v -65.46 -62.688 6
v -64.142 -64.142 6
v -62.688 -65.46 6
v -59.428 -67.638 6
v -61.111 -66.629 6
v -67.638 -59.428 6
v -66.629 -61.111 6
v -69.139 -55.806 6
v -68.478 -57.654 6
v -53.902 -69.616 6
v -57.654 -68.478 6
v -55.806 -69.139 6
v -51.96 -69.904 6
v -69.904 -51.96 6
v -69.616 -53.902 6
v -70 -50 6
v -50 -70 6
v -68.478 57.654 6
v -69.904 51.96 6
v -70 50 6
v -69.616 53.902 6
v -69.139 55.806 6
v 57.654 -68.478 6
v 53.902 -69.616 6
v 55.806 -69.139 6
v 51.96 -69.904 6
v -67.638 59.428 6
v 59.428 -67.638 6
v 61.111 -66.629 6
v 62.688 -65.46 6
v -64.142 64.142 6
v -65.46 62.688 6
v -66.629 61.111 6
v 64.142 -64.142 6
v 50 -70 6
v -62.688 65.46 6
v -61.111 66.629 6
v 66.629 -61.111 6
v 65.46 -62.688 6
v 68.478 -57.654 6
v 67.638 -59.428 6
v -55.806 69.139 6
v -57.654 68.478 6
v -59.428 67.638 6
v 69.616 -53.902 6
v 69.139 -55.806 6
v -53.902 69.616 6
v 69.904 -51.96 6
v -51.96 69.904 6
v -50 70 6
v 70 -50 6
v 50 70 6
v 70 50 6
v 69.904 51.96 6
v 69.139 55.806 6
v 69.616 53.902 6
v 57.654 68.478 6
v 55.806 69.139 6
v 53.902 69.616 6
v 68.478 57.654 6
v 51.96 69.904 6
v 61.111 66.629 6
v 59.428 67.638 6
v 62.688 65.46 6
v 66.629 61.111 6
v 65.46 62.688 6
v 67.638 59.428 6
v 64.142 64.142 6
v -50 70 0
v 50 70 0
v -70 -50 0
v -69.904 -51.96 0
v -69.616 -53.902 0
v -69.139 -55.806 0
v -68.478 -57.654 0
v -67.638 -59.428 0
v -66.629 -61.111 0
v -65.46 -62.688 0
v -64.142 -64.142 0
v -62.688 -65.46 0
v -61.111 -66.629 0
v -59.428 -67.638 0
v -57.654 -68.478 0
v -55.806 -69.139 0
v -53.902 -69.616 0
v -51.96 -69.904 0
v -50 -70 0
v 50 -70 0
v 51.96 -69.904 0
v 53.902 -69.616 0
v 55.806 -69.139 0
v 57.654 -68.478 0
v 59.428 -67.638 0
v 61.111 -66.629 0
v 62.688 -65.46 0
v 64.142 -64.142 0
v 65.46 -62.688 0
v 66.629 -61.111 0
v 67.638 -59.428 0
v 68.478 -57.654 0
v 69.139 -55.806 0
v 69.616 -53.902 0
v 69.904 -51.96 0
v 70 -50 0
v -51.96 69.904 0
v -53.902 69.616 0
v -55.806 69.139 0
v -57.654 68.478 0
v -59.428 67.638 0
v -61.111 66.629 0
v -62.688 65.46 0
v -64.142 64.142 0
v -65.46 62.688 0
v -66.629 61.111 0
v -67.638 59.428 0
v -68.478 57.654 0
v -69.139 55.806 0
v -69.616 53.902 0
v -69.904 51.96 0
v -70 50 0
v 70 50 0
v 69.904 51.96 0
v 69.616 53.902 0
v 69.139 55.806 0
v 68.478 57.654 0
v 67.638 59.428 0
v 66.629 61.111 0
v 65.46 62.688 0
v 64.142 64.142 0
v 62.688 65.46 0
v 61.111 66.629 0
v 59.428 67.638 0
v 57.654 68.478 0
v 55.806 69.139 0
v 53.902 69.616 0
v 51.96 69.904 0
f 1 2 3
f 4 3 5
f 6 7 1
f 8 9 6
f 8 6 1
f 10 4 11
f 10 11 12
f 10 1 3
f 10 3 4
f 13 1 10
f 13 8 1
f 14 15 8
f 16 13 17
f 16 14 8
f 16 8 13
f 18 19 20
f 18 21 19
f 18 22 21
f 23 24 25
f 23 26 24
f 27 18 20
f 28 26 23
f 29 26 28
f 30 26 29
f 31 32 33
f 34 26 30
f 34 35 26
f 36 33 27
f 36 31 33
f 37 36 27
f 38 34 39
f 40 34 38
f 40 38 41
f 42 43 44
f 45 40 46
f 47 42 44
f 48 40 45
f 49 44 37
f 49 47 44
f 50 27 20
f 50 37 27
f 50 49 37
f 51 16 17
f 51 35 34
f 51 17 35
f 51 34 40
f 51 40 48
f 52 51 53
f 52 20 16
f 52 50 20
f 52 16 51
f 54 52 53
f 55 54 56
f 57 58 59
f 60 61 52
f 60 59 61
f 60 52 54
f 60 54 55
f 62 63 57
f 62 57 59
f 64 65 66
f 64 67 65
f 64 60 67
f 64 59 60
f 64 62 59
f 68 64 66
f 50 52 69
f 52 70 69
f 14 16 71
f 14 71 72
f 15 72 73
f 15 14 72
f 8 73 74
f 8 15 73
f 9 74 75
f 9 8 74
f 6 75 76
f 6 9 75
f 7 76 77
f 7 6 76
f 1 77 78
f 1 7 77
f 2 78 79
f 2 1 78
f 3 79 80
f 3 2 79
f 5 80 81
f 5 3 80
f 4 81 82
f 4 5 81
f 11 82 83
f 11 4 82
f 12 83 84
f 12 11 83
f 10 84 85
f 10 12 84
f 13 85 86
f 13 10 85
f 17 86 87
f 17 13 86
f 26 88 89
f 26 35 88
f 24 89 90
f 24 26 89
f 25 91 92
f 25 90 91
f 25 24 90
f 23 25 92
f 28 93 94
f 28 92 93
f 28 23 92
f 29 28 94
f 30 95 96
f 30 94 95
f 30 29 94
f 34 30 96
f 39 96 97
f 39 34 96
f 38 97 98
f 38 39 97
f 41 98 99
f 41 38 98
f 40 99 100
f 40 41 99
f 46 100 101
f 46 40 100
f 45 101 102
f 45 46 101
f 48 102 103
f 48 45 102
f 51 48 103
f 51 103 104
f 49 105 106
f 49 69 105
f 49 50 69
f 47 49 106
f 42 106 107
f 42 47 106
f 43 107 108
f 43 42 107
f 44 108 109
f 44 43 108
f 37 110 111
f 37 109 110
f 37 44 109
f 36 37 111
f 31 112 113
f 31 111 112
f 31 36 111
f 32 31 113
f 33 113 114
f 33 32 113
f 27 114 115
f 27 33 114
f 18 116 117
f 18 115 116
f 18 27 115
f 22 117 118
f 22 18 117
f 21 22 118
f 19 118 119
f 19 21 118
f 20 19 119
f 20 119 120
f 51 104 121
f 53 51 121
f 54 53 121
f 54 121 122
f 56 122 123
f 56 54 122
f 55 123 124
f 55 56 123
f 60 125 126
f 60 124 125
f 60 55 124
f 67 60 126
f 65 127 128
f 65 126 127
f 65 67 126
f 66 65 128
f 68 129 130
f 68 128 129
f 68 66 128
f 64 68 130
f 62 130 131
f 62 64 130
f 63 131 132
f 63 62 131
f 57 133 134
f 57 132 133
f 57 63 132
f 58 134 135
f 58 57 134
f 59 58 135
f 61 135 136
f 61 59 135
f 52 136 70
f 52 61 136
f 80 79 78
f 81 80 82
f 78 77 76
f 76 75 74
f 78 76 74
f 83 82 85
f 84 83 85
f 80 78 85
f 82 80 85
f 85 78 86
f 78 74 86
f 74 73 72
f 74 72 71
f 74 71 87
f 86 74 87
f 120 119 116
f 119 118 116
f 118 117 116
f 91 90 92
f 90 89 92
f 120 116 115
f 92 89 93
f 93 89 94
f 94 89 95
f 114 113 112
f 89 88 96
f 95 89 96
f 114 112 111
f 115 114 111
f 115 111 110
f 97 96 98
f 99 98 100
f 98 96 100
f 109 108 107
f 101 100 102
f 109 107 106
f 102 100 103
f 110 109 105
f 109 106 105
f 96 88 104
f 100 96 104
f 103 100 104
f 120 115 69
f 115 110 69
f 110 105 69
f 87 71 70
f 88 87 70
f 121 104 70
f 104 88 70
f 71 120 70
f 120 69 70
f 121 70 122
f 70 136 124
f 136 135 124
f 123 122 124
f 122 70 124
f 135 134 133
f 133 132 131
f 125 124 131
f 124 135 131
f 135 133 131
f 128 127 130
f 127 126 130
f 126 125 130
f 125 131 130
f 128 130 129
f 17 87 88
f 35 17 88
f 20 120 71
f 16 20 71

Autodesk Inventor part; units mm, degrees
ref_plane "YZ Plane" through (0, 0, 0) normal (1, 0, 0) x (0, 1, 0)
ref_plane "XZ Plane" through (0, 0, 0) normal (0, 1, 0) x (-1, 0, 0)
ref_plane "XY Plane" through (0, 0, 0) normal (0, 0, 1) x (1, 0, 0)
sketch "Sketch1" plane through (0, 0, 0) normal (0, 0, 1) x (1, 0, 0)
  line L0 (-70, -70) -> (70, -70)
  line L1 (70, -70) -> (70, 70)
  line L2 (70, 70) -> (-70, 70)
  line L3 (-70, 70) -> (-70, -70)
  line L4 (-70, -70) -> (70, 70) construction
  line L5 (70, -70) -> (-70, 70) construction
  point P0 (0, 0)
  dimension "d0" = 140
  dimension "d1" = 140
extrude "Plate1" add sketch "Sketch1" along normal blind 6
fillet "Corner Round1" radius 20 4 edges at (70, -70, 3) (-70, -70, 3) (-70, 70, 3) (70, 70, 3)
equation "\"d0\" = d1"
equation "\"d2\" = Thickness"
equation "\"BendReliefWidth\" = Thickness"
equation "\"BendReliefDepth\" = 0.5 * Thickness"
equation "\"CornerReliefSize\" = 4 * Thickness"
equation "\"MinimumRemnant\" = 2 * Thickness"
equation "\"TransitionRadius\" = BendRadius"
equation "\"JacobiRadiusSize\" = BendRadius"
equation "\"GapSize\" = Thickness"
equation "\"Thickness\" = 6"
equation "\"BendRadius\" = 5"
properties part number "PNS 1694 leg plate for filter" material "Stainless Steel"
